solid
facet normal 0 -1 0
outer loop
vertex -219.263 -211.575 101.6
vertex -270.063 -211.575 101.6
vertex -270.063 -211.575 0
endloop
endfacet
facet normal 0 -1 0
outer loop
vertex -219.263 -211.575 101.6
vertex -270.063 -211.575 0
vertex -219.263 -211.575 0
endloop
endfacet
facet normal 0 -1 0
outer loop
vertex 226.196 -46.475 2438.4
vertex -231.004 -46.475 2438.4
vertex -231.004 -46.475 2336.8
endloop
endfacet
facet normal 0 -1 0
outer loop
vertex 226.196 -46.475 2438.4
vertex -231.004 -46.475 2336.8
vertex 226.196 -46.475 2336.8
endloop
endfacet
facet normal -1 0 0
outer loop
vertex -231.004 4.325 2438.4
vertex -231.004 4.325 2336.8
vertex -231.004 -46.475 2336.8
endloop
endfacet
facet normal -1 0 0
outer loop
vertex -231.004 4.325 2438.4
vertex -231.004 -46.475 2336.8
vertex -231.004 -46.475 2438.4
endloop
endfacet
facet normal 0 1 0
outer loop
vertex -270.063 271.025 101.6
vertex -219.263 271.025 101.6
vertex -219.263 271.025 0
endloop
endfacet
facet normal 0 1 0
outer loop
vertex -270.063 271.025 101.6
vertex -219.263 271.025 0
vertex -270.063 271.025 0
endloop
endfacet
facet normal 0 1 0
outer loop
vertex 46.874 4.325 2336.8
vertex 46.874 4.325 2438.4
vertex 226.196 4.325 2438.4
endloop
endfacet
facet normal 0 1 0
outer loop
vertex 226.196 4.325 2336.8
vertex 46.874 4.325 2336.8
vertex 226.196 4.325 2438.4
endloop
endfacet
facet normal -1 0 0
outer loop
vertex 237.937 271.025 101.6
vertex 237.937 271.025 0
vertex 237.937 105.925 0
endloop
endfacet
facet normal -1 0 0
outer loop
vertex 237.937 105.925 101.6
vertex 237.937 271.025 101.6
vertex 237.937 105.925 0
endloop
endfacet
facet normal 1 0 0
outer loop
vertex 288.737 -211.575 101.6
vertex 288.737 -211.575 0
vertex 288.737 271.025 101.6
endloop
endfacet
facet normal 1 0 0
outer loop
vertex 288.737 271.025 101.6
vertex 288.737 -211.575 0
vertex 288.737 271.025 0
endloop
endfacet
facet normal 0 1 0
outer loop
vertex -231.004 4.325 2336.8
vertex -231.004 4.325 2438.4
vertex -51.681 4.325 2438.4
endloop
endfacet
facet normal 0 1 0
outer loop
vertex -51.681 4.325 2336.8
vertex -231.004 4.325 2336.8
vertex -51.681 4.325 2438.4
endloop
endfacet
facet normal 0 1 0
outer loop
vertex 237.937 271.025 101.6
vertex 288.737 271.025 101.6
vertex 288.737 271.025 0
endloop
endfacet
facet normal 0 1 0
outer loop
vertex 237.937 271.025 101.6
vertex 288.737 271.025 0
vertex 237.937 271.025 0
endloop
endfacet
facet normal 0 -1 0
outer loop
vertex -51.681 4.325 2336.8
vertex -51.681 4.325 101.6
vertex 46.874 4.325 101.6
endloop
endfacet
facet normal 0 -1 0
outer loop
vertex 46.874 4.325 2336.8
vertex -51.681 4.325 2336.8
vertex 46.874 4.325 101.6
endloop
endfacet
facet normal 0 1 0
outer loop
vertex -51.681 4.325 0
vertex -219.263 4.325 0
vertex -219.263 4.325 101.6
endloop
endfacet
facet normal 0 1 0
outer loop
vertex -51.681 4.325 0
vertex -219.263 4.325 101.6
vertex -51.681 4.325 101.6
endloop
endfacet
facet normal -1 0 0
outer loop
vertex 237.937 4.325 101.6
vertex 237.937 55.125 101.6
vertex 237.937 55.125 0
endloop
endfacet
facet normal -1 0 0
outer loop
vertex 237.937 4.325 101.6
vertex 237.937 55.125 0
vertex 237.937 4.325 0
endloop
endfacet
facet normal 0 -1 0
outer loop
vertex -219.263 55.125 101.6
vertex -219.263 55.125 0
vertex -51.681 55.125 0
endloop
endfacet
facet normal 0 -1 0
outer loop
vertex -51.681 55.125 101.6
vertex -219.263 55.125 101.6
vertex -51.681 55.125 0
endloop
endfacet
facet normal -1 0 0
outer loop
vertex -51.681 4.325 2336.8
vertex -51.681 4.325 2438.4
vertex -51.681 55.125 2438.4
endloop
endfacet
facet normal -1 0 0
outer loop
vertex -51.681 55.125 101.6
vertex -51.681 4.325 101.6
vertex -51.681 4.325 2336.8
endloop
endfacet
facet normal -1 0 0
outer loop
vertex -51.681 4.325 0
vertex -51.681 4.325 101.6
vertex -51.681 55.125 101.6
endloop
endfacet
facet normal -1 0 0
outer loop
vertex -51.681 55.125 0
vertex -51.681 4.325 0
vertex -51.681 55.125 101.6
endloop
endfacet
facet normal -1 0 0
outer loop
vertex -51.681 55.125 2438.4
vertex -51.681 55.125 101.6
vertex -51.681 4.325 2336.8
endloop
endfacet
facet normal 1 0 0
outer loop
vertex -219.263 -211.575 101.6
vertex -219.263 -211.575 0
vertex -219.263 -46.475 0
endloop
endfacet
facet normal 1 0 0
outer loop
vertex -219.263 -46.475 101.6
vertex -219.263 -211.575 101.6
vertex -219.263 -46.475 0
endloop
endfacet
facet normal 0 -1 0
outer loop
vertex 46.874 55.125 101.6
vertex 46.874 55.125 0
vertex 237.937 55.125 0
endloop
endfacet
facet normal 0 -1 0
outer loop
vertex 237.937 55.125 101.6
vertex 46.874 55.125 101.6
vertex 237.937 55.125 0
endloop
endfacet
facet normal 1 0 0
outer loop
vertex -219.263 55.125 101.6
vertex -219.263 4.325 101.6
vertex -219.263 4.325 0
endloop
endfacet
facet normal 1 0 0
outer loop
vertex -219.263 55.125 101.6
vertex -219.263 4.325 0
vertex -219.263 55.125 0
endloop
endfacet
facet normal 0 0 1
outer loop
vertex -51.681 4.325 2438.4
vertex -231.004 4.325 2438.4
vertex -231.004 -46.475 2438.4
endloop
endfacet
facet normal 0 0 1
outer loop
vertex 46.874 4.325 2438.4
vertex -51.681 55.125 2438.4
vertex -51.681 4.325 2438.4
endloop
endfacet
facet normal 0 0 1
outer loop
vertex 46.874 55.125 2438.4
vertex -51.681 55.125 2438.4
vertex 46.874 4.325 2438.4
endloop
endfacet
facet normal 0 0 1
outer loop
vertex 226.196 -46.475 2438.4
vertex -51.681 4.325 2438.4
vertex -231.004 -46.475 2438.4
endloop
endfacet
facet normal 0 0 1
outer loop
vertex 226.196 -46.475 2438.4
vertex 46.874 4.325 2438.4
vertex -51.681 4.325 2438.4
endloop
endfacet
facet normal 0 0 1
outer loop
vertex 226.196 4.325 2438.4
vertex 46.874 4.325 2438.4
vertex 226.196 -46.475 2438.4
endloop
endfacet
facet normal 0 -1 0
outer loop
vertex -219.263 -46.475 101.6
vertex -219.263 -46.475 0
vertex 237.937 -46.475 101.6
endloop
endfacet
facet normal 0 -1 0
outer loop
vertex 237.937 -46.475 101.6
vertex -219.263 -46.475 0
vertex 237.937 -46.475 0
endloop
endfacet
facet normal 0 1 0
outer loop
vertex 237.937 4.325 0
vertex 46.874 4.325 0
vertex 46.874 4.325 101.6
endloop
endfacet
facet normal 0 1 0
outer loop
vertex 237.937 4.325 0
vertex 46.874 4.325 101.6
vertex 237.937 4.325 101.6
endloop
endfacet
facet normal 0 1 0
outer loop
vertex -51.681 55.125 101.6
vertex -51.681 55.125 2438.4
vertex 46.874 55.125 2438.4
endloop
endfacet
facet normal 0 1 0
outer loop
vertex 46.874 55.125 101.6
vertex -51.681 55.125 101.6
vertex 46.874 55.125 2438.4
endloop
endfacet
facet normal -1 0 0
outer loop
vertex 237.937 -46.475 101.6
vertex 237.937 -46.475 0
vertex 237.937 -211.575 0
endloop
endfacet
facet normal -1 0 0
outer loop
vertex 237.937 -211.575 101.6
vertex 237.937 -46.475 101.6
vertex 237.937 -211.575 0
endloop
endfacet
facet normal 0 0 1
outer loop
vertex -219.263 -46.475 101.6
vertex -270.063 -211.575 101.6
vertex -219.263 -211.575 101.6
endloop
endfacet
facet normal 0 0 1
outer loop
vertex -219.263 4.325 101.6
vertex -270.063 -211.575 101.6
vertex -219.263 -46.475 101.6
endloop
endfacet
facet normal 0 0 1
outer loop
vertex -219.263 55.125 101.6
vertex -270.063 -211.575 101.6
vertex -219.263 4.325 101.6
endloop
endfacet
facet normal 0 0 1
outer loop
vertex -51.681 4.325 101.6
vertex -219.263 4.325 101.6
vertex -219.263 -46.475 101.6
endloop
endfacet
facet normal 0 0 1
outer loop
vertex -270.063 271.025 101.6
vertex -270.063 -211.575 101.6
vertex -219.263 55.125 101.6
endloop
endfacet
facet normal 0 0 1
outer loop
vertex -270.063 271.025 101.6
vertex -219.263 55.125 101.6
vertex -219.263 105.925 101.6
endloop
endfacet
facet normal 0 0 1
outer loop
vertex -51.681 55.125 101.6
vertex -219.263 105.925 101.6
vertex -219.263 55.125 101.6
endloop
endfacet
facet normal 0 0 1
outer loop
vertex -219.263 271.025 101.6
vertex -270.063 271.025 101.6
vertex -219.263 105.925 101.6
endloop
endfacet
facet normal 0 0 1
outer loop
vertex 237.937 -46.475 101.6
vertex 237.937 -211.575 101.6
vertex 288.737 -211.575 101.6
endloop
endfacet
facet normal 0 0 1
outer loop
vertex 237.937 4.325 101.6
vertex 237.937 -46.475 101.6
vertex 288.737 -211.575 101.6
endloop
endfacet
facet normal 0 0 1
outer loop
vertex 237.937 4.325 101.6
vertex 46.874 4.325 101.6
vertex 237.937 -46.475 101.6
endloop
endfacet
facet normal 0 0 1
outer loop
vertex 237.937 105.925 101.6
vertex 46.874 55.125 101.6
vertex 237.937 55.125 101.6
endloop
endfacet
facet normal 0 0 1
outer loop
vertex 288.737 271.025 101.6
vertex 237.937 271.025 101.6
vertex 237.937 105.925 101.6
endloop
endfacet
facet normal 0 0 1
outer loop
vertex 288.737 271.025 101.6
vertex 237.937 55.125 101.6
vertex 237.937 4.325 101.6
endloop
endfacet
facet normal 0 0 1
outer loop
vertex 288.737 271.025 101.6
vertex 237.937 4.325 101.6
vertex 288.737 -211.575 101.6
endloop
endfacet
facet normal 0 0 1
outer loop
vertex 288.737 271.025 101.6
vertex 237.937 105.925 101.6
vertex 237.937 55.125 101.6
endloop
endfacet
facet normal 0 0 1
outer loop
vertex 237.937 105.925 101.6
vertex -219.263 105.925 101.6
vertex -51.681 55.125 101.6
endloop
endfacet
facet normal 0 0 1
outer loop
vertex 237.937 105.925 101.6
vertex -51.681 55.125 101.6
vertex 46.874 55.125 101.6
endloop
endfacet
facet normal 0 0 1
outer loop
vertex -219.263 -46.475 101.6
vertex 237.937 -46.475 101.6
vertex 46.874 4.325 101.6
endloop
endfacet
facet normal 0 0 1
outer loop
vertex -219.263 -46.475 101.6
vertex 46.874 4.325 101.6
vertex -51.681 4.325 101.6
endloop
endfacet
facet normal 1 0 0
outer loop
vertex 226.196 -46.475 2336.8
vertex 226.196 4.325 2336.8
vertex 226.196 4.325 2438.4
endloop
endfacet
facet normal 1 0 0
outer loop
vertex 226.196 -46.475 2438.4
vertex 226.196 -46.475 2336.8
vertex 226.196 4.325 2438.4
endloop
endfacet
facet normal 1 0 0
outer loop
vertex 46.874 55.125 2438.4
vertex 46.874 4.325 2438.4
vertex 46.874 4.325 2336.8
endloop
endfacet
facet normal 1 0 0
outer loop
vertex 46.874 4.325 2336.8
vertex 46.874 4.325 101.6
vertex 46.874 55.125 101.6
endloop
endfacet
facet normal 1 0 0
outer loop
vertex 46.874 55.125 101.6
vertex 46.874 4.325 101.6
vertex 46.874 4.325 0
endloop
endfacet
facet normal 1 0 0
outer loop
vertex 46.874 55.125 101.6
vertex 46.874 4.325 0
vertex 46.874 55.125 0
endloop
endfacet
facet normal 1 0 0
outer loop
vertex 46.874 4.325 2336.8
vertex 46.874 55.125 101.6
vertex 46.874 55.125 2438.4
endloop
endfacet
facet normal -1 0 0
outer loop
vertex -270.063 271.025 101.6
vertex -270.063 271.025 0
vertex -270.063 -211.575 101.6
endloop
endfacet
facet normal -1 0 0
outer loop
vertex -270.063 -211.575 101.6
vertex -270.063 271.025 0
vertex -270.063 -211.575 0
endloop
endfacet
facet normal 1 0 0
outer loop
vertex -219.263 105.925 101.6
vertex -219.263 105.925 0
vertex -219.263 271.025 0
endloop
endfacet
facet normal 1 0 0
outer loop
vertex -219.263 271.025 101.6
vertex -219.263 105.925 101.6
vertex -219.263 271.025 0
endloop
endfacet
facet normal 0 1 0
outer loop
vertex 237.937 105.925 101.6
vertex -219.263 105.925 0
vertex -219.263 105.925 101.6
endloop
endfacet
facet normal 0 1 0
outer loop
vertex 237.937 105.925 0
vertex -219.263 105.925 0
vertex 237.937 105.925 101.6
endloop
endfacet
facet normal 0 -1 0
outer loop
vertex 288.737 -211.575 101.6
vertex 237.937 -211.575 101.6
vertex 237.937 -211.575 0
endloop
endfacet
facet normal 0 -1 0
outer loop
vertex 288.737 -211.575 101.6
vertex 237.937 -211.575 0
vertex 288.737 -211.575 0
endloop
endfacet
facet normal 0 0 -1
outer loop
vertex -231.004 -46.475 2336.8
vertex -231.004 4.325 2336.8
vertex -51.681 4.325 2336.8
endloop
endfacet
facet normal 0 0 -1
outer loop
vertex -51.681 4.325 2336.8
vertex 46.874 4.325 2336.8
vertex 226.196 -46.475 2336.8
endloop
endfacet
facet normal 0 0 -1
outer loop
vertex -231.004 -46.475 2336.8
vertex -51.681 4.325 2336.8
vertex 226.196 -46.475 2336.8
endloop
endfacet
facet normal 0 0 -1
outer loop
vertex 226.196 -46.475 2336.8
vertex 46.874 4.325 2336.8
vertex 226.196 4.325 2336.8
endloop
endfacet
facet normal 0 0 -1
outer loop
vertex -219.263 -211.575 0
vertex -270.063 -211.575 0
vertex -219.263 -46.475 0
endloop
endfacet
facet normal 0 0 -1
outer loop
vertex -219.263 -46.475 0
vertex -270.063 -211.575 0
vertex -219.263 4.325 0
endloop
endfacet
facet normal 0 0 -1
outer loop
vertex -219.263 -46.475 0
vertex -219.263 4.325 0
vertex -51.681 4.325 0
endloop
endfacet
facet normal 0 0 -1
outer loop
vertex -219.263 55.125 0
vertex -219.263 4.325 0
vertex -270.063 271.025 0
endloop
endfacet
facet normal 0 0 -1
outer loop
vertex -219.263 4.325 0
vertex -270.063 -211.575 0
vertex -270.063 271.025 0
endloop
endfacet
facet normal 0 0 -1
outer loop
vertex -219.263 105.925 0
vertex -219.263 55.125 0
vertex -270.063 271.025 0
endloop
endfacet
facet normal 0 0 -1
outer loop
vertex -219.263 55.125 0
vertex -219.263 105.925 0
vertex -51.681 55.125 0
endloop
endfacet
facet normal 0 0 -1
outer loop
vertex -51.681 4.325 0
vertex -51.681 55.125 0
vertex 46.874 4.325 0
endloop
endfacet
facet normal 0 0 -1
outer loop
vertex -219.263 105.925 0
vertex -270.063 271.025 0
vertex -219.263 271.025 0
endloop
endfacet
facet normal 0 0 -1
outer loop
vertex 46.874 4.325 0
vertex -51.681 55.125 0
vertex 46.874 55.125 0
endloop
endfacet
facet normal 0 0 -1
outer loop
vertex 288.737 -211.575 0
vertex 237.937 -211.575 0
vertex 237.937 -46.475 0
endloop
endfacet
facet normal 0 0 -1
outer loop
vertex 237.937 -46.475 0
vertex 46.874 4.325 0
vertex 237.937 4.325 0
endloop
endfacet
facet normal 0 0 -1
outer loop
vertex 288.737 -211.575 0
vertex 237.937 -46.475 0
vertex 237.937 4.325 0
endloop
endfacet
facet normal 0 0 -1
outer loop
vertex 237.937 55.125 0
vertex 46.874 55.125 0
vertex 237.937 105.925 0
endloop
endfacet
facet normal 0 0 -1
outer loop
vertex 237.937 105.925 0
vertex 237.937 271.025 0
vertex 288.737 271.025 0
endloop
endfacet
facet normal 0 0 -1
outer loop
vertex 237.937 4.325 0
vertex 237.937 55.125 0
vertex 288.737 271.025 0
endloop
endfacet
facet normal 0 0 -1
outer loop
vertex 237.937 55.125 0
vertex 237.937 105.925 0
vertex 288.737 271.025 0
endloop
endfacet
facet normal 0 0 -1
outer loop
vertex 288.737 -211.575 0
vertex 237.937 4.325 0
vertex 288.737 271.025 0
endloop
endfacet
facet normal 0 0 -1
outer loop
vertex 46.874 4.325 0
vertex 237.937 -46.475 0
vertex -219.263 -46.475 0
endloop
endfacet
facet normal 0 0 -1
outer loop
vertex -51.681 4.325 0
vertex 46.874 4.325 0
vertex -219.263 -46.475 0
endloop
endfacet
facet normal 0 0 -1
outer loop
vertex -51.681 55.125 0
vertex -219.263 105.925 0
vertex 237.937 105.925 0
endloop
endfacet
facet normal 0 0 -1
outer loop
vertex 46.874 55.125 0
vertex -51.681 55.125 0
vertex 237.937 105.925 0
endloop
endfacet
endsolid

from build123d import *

# Parameters (mm, degrees)
F0_W     = 457.2
F0_H     = 50.8
F1_DEPTH = 101.6
F2_W     = 98.554954
F2_H     = 50.8
F3_DEPTH = 2438.4
F4_W     = 457.2
F4_H     = 101.6
F5_DEPTH = 50.8


with BuildPart() as f1:
    # F0 (on Top) → F1 (new body)
    with BuildSketch(Plane.XY):
        with Locations((9.337193, 80.525405)):
            Rectangle(F0_W, F0_H)
        Polygon((-219.262807, 55.125405), (-219.262807, 105.925405), (-219.262807, 271.025405), (-270.062807, 271.025405), (-270.062807, -211.574595), (-219.262807, -211.574595), (-219.262807, -46.474595), (-219.262807, 4.325405), align=None)
        Polygon((237.937193, 271.025405), (237.937193, 105.925405), (237.937193, 55.125405), (237.937193, 4.325405), (237.937193, -46.474595), (237.937193, -211.574595), (288.737193, -211.574595), (288.737193, 271.025405), align=None)
        with Locations((9.337193, -21.074595)):
            Rectangle(F0_W, F0_H)
    extrude(amount=F1_DEPTH)

    # F2 (on Top) → F3 (join)
    with BuildSketch(Plane.XY):
        with Locations((-2.403777, 29.725405)):
            Rectangle(F2_W, F2_H)
    extrude(amount=F3_DEPTH)

    # F4 (on face) → F5 (join)
    with BuildSketch(Plane.XZ.offset(-4.325405)):
        with Locations((-2.403777, 2387.6)):
            Rectangle(F4_W, F4_H)
    extrude(amount=F5_DEPTH)


solid = f1.part
